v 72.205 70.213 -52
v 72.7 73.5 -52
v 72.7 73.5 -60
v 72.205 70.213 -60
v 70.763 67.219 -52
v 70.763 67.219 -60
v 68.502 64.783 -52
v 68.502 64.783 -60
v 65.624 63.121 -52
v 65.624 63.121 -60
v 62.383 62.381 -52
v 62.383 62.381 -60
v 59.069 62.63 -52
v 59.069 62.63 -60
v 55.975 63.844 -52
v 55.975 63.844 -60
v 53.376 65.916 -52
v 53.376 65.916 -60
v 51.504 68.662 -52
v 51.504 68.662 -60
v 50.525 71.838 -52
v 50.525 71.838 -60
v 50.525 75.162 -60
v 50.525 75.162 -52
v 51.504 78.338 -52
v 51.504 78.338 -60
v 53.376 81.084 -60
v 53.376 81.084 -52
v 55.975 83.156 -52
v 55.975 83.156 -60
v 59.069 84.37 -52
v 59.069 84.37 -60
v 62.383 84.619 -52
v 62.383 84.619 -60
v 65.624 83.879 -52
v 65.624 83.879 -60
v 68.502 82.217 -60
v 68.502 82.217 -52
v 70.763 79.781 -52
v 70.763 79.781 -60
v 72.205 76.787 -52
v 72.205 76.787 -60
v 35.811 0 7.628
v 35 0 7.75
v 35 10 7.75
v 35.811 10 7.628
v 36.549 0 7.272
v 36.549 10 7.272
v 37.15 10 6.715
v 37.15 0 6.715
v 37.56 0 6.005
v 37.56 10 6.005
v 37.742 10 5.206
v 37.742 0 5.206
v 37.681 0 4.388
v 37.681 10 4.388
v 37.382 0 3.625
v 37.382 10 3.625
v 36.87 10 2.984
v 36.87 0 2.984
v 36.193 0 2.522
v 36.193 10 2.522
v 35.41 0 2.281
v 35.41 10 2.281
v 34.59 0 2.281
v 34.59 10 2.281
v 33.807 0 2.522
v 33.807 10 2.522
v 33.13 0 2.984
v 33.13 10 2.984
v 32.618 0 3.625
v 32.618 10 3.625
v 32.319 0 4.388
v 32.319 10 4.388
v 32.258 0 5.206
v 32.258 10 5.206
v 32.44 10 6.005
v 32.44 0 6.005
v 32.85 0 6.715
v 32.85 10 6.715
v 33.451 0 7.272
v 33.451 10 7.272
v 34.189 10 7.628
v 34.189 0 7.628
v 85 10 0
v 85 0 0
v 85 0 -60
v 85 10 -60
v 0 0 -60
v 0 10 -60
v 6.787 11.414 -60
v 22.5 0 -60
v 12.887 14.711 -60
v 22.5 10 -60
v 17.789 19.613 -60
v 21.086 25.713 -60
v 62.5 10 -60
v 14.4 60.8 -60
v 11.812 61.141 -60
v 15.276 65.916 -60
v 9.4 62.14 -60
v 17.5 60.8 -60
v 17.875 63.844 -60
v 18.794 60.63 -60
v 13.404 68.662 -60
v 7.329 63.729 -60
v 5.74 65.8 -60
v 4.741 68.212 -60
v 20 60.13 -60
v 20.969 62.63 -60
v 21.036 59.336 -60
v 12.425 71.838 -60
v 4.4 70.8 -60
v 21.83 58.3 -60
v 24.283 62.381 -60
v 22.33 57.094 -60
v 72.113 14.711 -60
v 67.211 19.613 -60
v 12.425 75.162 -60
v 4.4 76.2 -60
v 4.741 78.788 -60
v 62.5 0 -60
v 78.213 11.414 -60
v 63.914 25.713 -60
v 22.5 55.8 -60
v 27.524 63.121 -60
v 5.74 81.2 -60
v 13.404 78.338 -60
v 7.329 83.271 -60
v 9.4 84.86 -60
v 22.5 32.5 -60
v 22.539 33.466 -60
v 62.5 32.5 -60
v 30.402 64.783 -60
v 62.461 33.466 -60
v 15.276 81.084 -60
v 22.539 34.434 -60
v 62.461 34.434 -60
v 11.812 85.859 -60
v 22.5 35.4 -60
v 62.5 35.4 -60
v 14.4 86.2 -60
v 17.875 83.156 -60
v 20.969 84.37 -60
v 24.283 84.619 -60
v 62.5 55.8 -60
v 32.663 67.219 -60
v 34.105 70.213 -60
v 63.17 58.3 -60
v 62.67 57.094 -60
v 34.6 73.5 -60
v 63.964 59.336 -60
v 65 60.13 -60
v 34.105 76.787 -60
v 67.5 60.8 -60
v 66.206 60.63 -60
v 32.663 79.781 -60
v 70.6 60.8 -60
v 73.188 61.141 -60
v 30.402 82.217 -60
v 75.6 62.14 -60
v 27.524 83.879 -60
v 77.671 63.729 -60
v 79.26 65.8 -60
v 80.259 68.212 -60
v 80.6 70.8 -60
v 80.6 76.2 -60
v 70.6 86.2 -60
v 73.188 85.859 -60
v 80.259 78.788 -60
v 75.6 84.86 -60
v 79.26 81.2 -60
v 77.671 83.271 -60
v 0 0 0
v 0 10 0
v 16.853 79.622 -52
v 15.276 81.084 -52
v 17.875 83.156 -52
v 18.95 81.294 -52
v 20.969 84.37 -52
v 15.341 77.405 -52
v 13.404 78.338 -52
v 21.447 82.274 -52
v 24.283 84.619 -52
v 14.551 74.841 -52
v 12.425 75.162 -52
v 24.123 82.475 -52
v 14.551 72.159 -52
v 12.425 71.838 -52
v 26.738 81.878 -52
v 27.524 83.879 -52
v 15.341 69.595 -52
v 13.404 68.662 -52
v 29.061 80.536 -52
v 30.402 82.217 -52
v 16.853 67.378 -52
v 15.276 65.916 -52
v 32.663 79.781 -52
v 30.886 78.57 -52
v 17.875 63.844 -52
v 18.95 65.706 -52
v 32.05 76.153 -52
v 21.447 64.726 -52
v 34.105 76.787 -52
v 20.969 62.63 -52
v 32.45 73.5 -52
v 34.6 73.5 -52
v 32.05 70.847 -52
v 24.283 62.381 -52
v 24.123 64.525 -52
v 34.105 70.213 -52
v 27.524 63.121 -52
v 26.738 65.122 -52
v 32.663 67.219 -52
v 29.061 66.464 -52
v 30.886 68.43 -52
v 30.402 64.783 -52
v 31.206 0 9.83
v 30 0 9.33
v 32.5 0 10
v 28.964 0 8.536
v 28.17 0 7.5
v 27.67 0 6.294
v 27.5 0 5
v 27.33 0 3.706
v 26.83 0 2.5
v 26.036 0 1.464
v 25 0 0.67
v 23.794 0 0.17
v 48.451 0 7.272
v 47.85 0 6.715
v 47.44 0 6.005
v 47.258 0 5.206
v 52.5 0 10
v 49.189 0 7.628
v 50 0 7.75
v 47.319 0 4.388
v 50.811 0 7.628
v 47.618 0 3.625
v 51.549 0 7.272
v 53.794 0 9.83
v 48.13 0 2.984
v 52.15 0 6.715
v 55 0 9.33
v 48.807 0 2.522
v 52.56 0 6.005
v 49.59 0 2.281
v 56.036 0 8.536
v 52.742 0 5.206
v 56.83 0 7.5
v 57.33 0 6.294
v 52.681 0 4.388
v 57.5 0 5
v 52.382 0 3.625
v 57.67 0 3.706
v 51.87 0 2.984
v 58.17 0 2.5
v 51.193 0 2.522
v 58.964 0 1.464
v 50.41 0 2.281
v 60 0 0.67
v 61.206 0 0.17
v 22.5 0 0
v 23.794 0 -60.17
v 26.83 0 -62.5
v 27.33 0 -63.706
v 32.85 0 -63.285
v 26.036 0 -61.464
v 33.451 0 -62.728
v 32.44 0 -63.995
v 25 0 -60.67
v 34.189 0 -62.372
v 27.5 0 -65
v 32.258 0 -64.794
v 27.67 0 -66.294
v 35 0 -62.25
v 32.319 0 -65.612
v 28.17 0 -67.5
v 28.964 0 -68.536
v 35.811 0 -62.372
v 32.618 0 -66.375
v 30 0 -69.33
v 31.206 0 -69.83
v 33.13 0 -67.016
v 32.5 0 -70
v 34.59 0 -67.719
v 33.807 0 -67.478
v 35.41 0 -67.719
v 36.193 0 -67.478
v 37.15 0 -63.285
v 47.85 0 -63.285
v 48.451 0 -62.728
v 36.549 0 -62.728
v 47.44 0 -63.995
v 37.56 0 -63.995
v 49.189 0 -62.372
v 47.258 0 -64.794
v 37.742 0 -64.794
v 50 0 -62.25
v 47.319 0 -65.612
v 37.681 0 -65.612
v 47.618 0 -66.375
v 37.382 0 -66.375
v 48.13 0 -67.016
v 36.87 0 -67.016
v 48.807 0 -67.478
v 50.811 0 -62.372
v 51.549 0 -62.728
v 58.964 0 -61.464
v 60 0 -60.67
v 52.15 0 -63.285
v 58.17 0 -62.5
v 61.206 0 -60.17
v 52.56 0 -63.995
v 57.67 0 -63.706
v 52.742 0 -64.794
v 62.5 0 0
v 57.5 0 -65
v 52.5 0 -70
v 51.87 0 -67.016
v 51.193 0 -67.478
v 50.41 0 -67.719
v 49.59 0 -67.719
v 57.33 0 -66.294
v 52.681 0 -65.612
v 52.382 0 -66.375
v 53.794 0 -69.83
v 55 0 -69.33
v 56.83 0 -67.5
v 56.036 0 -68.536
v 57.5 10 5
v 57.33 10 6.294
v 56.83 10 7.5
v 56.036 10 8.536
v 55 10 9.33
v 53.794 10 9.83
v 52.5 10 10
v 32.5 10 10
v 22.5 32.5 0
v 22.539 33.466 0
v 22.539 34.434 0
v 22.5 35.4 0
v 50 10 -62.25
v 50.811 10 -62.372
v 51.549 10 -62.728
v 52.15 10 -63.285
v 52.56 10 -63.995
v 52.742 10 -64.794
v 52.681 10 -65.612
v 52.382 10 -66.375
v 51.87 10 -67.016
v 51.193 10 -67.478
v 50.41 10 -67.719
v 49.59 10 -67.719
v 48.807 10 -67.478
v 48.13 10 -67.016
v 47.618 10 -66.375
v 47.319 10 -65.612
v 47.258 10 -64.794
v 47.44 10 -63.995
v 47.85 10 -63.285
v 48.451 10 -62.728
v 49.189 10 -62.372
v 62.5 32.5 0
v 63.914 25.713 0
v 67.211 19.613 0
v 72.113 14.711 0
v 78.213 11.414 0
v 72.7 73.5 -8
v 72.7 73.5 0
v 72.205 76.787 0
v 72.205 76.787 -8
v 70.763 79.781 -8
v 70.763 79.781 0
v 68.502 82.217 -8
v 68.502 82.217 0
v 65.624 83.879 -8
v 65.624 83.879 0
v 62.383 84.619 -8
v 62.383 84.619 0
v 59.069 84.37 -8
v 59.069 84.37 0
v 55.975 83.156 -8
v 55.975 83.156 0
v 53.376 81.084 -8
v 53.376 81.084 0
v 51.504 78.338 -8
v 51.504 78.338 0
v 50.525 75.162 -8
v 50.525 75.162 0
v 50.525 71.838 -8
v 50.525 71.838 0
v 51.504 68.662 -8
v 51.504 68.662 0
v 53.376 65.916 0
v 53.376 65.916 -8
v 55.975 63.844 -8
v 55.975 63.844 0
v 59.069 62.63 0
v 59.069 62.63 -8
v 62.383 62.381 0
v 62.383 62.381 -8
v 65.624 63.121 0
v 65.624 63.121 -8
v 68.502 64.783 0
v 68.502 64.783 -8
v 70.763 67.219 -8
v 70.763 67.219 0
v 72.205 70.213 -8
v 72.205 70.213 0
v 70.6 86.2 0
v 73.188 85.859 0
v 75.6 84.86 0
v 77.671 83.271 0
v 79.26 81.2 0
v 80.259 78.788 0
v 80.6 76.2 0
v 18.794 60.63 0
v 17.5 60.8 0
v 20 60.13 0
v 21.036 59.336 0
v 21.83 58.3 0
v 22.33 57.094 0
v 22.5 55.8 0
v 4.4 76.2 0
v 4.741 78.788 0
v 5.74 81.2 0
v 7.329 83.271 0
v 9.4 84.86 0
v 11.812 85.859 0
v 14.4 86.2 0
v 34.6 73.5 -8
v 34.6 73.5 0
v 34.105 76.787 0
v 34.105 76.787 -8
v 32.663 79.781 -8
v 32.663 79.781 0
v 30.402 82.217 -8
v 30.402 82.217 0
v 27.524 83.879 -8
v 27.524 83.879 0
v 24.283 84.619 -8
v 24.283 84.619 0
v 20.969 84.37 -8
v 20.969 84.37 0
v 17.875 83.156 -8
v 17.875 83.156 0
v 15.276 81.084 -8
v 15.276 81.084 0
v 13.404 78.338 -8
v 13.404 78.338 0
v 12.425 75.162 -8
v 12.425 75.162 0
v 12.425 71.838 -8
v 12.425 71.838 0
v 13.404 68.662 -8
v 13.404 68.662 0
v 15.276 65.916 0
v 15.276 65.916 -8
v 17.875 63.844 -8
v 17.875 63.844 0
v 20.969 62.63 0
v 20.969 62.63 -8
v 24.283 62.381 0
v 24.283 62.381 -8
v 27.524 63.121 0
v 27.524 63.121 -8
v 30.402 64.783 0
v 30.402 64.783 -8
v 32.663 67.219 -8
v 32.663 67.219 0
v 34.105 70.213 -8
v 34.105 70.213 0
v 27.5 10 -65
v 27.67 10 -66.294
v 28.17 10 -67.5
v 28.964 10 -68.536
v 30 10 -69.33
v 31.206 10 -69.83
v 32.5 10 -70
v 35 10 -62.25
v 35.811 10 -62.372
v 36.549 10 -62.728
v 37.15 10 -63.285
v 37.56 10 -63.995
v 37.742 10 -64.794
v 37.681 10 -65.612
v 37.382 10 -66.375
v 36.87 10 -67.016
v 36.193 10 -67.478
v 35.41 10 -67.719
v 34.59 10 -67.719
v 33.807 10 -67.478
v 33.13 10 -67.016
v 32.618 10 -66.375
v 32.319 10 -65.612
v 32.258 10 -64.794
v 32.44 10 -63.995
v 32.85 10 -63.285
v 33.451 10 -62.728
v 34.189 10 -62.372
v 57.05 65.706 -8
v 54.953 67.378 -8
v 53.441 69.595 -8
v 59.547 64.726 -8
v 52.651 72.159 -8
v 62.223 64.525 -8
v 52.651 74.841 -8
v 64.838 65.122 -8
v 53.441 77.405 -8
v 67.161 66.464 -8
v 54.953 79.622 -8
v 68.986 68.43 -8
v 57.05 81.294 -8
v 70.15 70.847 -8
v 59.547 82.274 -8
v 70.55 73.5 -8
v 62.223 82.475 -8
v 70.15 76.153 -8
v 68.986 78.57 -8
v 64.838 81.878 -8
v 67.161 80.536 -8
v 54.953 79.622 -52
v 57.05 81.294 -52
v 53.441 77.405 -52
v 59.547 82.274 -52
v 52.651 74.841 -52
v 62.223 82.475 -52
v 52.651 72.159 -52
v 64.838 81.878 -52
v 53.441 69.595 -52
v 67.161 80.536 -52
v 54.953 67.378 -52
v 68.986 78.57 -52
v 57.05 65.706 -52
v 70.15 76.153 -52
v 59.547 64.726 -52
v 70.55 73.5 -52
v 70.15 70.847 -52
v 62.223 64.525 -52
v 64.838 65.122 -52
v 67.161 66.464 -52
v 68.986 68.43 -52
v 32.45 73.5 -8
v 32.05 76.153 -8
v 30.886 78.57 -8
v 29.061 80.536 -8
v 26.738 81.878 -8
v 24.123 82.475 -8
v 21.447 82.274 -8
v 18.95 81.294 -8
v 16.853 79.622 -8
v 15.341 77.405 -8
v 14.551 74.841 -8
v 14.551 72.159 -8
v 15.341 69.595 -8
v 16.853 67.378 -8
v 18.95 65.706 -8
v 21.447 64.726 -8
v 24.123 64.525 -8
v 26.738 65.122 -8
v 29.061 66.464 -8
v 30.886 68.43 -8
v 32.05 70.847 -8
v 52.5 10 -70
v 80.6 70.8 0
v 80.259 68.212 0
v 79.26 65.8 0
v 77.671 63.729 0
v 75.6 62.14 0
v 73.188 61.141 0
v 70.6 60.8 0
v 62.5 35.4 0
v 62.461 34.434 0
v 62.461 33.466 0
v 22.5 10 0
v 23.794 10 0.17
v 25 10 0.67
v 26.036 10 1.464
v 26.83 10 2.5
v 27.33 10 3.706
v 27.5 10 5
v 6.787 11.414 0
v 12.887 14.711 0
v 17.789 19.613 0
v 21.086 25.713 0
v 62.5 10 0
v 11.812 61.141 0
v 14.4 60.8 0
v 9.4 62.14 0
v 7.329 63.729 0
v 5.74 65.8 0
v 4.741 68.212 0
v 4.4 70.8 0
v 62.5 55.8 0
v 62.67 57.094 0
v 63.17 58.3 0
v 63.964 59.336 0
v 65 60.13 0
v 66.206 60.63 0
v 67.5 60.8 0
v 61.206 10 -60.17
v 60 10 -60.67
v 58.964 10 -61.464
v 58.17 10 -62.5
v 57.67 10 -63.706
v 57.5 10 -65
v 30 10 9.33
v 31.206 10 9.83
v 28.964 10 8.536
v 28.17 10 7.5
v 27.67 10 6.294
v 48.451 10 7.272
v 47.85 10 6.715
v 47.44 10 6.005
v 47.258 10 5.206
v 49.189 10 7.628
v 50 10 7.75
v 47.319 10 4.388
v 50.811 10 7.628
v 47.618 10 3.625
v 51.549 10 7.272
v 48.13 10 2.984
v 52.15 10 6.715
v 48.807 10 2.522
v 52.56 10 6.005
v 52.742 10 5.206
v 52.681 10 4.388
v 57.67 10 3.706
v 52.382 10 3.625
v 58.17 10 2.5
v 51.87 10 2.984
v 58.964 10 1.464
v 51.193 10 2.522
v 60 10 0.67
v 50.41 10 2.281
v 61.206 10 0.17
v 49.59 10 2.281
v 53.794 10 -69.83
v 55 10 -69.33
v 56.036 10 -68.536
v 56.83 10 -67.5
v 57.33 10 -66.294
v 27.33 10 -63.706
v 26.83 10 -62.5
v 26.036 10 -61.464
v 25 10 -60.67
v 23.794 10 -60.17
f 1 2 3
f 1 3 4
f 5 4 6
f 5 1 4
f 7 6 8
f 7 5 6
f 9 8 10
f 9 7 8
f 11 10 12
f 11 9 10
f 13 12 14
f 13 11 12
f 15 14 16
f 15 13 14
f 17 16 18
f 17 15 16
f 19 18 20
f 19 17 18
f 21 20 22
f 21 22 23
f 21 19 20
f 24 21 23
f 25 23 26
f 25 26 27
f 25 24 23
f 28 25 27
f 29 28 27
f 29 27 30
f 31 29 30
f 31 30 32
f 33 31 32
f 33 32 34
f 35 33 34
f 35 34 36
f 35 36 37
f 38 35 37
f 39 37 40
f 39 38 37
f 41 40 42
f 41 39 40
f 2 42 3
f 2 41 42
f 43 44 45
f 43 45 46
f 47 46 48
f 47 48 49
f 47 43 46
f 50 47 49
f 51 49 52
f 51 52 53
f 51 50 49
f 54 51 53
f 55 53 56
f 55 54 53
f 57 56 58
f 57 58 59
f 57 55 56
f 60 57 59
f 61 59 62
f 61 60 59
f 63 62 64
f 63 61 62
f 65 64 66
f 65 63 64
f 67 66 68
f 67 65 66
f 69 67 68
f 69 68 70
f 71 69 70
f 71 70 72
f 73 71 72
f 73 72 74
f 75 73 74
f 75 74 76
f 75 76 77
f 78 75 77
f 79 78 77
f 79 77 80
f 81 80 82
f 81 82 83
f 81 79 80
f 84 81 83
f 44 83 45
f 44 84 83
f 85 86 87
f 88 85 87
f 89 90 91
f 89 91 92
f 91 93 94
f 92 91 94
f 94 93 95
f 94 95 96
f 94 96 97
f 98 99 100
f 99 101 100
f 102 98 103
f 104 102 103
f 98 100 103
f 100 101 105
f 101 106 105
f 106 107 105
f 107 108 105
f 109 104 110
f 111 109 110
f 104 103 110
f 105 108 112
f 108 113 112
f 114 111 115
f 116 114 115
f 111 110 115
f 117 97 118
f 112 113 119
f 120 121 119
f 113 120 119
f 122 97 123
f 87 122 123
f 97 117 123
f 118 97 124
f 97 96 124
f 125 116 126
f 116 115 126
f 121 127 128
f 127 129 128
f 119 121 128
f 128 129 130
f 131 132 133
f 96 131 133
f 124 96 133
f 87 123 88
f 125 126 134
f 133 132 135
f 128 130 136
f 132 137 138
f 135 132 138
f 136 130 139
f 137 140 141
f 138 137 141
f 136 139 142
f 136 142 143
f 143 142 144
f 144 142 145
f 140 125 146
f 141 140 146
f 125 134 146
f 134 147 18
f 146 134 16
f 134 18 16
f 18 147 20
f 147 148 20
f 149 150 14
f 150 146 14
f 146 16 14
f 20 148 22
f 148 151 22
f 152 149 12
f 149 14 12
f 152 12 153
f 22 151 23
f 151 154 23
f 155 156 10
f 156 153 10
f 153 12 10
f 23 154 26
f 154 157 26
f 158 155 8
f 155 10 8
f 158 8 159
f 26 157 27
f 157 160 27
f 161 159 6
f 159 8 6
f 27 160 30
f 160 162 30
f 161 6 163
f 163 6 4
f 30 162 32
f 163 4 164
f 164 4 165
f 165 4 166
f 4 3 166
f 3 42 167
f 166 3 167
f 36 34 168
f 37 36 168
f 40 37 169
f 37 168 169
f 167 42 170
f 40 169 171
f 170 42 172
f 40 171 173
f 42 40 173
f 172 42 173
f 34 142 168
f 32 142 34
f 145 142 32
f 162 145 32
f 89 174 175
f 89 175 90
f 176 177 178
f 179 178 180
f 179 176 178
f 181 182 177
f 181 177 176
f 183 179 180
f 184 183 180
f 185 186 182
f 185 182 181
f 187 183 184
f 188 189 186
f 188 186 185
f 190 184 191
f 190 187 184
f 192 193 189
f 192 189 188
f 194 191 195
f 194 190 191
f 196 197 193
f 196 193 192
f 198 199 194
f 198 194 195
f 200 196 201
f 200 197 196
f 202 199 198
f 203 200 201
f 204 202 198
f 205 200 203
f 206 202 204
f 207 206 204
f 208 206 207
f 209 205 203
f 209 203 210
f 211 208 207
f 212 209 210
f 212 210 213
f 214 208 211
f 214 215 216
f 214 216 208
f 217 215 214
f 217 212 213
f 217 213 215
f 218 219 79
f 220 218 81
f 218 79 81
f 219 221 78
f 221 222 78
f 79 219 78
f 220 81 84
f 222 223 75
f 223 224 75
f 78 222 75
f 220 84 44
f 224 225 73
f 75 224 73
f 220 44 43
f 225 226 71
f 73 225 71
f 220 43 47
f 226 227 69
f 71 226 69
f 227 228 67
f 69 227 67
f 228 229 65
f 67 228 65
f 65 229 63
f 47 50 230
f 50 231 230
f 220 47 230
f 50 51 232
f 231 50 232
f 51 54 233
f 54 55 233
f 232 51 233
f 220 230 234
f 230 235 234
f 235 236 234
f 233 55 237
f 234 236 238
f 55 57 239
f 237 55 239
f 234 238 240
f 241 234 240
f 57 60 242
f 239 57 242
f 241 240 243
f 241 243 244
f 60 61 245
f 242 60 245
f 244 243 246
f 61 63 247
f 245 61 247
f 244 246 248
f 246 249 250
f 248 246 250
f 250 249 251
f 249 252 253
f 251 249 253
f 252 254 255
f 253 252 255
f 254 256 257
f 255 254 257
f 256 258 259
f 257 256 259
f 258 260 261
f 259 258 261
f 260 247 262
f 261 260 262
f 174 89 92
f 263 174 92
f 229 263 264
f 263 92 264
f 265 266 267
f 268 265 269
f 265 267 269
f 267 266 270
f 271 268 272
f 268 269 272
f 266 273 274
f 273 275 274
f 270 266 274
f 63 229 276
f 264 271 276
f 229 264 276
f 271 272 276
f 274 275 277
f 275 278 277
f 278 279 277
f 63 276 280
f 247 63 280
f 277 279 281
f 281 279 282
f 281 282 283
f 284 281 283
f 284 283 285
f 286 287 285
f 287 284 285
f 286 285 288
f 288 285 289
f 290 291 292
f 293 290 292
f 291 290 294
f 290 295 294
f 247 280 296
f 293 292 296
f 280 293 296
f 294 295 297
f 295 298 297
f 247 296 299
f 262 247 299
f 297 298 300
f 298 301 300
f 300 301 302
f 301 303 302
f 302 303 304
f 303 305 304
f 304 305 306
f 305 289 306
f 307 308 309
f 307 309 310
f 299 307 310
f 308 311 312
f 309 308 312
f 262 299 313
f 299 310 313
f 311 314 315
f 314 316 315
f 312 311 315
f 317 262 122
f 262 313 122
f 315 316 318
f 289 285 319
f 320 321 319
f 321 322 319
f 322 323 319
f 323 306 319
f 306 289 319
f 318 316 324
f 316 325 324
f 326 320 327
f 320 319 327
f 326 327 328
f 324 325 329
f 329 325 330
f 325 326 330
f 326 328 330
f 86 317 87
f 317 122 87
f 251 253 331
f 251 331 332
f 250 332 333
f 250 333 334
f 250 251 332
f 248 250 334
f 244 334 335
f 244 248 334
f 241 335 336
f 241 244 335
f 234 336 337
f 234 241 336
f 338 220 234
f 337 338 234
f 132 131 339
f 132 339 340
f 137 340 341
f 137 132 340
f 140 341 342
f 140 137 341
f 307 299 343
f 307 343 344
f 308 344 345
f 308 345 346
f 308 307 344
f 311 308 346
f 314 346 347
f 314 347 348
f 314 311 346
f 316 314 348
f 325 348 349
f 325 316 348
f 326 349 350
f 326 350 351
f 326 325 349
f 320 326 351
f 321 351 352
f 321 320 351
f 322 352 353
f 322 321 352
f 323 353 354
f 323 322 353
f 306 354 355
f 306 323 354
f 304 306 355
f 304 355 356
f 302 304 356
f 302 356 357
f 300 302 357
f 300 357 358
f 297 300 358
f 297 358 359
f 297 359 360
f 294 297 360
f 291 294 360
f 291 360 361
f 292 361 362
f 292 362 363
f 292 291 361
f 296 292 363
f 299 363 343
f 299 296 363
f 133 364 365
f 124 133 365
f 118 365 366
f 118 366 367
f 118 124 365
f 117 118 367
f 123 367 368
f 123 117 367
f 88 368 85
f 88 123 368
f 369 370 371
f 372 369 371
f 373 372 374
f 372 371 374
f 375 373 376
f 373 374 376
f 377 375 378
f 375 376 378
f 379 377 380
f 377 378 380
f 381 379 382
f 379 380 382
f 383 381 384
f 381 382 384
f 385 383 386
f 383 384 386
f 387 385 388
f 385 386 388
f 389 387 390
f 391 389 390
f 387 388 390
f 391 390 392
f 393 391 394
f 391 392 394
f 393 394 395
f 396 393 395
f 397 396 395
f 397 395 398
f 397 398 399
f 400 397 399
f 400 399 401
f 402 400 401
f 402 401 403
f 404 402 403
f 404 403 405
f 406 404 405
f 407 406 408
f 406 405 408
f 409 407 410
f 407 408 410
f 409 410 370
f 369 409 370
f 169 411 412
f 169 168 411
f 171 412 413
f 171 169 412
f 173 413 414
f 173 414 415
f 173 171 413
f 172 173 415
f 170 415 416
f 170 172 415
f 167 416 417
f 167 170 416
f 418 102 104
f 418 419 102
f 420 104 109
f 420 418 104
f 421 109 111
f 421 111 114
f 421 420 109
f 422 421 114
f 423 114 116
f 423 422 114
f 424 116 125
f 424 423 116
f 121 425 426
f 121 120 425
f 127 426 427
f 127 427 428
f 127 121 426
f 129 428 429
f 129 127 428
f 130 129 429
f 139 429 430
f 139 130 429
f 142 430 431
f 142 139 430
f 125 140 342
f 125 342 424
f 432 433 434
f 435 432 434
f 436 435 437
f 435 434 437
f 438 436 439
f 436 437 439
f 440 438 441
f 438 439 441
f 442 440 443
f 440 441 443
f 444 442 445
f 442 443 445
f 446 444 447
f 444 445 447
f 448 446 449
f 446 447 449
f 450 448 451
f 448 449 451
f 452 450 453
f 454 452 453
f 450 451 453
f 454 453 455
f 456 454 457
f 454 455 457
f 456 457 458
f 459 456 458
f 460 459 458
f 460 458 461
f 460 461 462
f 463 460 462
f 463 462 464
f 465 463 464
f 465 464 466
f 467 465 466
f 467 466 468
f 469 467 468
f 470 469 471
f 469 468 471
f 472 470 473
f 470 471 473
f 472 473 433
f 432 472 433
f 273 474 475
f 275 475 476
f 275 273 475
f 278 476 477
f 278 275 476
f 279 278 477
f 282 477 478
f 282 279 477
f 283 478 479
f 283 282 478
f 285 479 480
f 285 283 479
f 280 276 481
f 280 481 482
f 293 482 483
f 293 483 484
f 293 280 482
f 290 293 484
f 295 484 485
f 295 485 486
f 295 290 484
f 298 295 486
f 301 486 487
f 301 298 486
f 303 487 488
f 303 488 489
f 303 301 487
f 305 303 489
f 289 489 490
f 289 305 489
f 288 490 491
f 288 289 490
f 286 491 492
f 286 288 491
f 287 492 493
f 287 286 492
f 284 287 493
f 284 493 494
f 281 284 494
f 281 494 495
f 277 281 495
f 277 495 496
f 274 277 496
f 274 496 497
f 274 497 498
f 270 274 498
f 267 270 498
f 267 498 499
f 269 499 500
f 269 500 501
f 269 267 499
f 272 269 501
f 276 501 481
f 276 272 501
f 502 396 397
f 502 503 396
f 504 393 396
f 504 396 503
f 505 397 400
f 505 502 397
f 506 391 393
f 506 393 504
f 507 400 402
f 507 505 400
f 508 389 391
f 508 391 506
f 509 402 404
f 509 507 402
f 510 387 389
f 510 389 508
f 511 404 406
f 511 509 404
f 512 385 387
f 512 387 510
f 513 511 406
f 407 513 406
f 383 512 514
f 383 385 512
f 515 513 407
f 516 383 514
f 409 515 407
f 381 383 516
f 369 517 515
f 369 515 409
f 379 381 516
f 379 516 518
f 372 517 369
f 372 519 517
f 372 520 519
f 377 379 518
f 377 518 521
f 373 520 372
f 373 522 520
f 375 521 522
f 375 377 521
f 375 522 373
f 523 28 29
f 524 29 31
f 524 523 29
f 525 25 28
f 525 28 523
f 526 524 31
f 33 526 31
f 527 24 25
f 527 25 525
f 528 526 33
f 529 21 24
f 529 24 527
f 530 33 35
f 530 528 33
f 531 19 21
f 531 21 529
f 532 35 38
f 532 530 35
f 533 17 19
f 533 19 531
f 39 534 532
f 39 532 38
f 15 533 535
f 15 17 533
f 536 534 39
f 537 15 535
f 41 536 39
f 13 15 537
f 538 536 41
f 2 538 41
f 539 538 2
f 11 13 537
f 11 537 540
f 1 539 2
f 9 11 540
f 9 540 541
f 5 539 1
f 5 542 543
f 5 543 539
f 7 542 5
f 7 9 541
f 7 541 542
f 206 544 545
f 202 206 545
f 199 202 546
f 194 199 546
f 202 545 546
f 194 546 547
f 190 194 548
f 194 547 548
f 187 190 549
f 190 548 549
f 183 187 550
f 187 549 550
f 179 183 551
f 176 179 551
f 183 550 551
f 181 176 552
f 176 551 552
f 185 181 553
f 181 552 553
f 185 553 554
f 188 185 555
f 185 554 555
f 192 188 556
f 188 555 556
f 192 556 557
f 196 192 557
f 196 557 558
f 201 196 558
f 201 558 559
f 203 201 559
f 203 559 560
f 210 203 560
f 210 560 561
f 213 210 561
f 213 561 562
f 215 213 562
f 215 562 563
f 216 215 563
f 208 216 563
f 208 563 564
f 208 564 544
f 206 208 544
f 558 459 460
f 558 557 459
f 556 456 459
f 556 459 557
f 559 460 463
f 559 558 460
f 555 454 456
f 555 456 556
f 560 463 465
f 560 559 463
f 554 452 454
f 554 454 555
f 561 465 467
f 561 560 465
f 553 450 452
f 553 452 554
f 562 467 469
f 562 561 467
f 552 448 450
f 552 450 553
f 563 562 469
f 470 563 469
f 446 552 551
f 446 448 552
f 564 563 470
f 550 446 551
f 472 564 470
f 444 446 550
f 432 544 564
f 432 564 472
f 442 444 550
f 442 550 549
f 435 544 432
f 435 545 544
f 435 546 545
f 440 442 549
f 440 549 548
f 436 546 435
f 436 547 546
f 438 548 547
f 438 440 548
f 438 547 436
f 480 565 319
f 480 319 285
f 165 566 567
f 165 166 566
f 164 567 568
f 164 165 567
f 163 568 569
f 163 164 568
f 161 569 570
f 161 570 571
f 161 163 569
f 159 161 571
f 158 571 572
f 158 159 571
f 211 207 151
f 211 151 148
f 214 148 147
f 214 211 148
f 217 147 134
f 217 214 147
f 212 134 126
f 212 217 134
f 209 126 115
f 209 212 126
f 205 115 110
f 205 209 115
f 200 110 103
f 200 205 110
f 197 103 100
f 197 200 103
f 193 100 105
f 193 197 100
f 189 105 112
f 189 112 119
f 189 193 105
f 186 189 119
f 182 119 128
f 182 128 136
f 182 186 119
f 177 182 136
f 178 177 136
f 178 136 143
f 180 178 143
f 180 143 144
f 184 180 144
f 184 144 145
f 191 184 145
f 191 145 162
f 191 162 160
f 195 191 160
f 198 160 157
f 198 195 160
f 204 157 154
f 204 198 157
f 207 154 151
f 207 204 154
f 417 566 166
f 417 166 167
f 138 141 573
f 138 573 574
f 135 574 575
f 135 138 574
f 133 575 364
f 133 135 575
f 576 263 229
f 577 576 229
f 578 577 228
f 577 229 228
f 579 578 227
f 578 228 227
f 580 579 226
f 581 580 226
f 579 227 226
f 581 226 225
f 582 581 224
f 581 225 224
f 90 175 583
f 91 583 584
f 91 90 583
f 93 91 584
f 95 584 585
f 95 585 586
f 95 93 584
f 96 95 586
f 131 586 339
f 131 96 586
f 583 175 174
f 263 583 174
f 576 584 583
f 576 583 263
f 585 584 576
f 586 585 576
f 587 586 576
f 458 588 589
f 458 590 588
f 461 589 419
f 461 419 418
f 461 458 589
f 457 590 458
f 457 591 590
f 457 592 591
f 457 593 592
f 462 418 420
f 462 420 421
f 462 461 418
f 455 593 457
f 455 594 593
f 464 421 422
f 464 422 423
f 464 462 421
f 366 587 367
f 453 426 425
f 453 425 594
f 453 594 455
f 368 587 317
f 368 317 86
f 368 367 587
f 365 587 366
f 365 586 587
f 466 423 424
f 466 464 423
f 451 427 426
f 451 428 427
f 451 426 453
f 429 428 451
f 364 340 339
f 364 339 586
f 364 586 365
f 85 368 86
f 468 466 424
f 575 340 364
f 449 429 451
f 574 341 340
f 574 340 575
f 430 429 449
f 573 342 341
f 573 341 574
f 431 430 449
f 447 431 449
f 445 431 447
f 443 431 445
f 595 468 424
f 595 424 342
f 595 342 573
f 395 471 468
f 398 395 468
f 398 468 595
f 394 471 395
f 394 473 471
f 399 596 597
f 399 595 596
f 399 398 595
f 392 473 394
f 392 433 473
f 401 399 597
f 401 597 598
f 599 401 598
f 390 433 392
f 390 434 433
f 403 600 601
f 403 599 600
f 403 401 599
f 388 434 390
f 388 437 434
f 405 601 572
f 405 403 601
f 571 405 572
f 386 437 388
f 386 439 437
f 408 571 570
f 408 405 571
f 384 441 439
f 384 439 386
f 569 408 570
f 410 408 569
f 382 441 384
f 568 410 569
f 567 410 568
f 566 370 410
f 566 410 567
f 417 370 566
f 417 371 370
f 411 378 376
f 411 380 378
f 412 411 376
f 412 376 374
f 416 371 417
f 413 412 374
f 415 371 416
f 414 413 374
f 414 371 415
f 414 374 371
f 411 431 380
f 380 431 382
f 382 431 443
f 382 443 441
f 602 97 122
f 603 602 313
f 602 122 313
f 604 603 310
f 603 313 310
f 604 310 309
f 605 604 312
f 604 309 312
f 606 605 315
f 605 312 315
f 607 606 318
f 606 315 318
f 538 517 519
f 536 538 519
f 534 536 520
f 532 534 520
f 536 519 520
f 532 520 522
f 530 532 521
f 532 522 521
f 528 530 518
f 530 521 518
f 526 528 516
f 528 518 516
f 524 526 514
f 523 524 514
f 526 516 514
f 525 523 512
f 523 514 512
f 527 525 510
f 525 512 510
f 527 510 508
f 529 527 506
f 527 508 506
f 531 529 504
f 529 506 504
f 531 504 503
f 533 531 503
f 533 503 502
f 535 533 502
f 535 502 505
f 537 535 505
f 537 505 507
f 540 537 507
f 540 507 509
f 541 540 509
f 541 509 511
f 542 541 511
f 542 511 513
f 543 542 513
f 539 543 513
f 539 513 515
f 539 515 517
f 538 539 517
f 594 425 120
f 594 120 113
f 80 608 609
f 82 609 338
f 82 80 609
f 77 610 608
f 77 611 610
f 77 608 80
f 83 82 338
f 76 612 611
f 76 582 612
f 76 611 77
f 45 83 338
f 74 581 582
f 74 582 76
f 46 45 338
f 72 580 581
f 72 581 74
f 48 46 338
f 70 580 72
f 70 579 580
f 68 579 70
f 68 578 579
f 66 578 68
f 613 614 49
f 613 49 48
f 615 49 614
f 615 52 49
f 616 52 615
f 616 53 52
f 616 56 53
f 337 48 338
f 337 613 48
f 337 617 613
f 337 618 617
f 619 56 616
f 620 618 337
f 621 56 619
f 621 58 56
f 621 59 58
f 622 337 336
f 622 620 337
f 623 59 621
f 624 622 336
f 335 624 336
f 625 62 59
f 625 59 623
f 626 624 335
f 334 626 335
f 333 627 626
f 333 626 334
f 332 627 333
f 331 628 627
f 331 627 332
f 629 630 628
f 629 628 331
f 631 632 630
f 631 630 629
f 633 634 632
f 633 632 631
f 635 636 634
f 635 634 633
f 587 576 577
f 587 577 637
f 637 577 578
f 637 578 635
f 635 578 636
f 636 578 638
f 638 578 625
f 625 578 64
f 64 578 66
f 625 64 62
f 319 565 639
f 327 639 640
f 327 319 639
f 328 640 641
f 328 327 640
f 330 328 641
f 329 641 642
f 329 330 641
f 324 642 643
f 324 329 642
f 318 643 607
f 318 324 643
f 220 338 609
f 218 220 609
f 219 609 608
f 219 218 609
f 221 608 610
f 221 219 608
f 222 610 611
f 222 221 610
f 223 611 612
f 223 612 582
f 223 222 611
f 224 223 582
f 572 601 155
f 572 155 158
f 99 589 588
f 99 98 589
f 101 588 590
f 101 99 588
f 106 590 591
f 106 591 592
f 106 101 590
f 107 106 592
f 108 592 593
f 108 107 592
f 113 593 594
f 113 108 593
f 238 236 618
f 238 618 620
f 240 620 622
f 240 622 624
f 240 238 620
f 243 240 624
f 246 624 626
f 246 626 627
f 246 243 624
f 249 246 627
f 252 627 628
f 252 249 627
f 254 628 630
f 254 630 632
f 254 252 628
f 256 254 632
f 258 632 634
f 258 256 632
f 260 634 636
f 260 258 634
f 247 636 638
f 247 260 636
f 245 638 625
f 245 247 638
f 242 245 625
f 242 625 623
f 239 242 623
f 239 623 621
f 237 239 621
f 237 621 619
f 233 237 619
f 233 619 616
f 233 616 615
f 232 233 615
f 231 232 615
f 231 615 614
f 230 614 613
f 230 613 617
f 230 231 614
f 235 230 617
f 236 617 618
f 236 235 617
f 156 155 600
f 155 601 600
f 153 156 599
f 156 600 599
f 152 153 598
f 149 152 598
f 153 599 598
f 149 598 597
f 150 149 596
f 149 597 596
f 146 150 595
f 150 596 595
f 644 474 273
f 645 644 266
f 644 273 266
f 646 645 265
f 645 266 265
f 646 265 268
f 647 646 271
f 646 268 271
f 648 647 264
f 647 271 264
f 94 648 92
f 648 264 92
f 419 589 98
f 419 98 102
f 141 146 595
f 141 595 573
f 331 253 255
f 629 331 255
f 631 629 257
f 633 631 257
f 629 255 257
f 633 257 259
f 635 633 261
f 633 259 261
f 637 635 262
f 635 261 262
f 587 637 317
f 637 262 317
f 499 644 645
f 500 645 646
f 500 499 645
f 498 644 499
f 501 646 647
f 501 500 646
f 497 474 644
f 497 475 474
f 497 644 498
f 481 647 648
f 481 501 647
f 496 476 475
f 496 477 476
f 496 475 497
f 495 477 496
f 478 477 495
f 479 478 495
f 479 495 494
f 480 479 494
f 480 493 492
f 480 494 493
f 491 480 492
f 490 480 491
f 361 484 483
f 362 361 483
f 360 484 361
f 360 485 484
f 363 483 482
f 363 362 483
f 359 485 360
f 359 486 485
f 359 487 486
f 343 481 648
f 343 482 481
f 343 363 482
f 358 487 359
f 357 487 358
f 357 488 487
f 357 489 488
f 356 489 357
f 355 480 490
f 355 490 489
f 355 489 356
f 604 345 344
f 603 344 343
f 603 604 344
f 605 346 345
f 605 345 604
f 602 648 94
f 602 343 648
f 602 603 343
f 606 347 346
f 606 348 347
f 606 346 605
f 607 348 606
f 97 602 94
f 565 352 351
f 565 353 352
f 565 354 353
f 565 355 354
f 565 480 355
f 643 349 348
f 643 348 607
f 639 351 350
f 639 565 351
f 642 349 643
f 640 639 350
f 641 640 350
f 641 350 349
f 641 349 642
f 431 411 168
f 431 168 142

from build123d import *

# Parameters (mm, degrees)
SKETCH1_W           = 15
SKETCH1_H           = 10
SKETCH1_R           = 2.75
SKETCH1_W_2         = 85
SKETCH1_H_2         = 60
BOSS_EXTRUDE1_DEPTH = 10
BOSS_EXTRUDE2_DEPTH = 70
CUT_EXTRUDE1_DEPTH  = 10
FILLET1_START       = -1
FILLET1_DEPTH       = 11
FILLET1_2_DEPTH     = 10
SKETCH5_R           = 9
BOSS_EXTRUDE3_DEPTH = 60
SKETCH6_R           = 11.15
CUT_EXTRUDE2_DEPTH  = 8
CUT_EXTRUDE3_START  = -8
SKETCH7_R           = 11.15
CUT_EXTRUDE3_DEPTH  = 8
FILLET2_R           = 10
FILLET3_R           = 5


with BuildPart() as part:
    # Sketch1 → Boss-Extrude1 (new body)
    # profile 1 of 5: a face of its own
    with BuildSketch(Plane(origin=(0, 0, 0), x_dir=(1, 0, 0), z_dir=(0, 1, 0))):
        with Locations((35, 65)):
            Rectangle(SKETCH1_W, SKETCH1_H)
        with Locations(Location((35, 65, 0), (0, 0, 270))):
            Circle(SKETCH1_R, mode=Mode.SUBTRACT)
    # profile 2 of 5: a face of its own
    with BuildSketch(Plane(origin=(0, 0, 0), x_dir=(1, 0, 0), z_dir=(0, 1, 0))):
        with Locations((50, 65)):
            Rectangle(SKETCH1_W, SKETCH1_H)
        with Locations(Location((50, 65, 0), (0, 0, 270))):
            Circle(SKETCH1_R, mode=Mode.SUBTRACT)
    # profile 3 of 5: a face of its own
    with BuildSketch(Plane(origin=(0, 0, 0), x_dir=(1, 0, 0), z_dir=(0, 1, 0))):
        with Locations((50, -5)):
            Rectangle(SKETCH1_W, SKETCH1_H)
        with Locations(Location((50, -5, 0), (0, 0, 270))):
            Circle(SKETCH1_R, mode=Mode.SUBTRACT)
    # profile 4 of 5: a face of its own
    with BuildSketch(Plane(origin=(0, 0, 0), x_dir=(1, 0, 0), z_dir=(0, 1, 0))):
        with Locations((35, -5)):
            Rectangle(SKETCH1_W, SKETCH1_H)
        with Locations(Location((35, -5, 0), (0, 0, 270))):
            Circle(SKETCH1_R, mode=Mode.SUBTRACT)
    # profile 5 of 5: a face of its own
    with BuildSketch(Plane(origin=(0, 0, 0), x_dir=(1, 0, 0), z_dir=(0, 1, 0))):
        with Locations((42.5, 30)):
            Rectangle(SKETCH1_W_2, SKETCH1_H_2)
    extrude(amount=BOSS_EXTRUDE1_DEPTH)

    # Sketch4 → Boss-Extrude2 (add)
    with BuildSketch(Plane(origin=(0, 0, -70), x_dir=(-1, 0, 0), z_dir=(0, 0, -1))):
        with BuildLine():
            Line((-85, 10), (-62.5, 10))
            Line((-62.5, 10), (-62.5, 32.5))
            ThreePointArc((-62.5, 32.5), (-69.483783569, 16.983783569), (-85, 10))
        make_face()
        with BuildLine():
            Line((-57.5, 10), (-42.5, 10))
            Line((-42.5, 10), (-42.5, 60.8))
            Line((-42.5, 60.8), (-62.5, 60.8))
            Line((-62.5, 60.8), (-62.5, 35.4))
            ThreePointArc((-62.5, 35.4), (-62.45614662, 33.95), (-62.5, 32.5))
            Line((-62.5, 32.5), (-62.5, 10))
            Line((-62.5, 10), (-57.5, 10))
        make_face()
        with BuildLine():
            Line((-42.5, 60.8), (-42.5, 10))
            Line((-42.5, 10), (-27.5, 10))
            Line((-27.5, 10), (-22.5, 10))
            Line((-22.5, 10), (-22.5, 32.5))
            ThreePointArc((-22.5, 32.5), (-22.54385338, 33.95), (-22.5, 35.4))
            Line((-22.5, 35.4), (-22.5, 60.8))
            Line((-22.5, 60.8), (-42.5, 60.8))
        make_face()
        with BuildLine():
            Line((-22.5, 32.5), (-22.5, 10))
            Line((-22.5, 10), (0, 10))
            ThreePointArc((0, 10), (-15.516216431, 16.983783569), (-22.5, 32.5))
        make_face()
    extrude(amount=-BOSS_EXTRUDE2_DEPTH)

    # Sketch4<4> → Cut-Extrude1 (cut)
    with BuildSketch(Plane(origin=(0, 0, -70), x_dir=(-1, 0, 0), z_dir=(0, 0, -1))):
        with BuildLine():
            Line((-57.5, 10), (-42.5, 10))
            Line((-42.5, 10), (-42.5, 60.8))
            Line((-42.5, 60.8), (-62.5, 60.8))
            Line((-62.5, 60.8), (-62.5, 35.4))
            ThreePointArc((-62.5, 35.4), (-62.45614662, 33.95), (-62.5, 32.5))
            Line((-62.5, 32.5), (-62.5, 10))
            Line((-62.5, 10), (-57.5, 10))
        make_face()
        with BuildLine():
            Line((-42.5, 60.8), (-42.5, 10))
            Line((-42.5, 10), (-27.5, 10))
            Line((-27.5, 10), (-22.5, 10))
            Line((-22.5, 10), (-22.5, 32.5))
            ThreePointArc((-22.5, 32.5), (-22.54385338, 33.95), (-22.5, 35.4))
            Line((-22.5, 35.4), (-22.5, 60.8))
            Line((-22.5, 60.8), (-42.5, 60.8))
        make_face()
        with BuildLine():
            Line((-85, 10), (-62.5, 10))
            Line((-62.5, 10), (-62.5, 32.5))
            ThreePointArc((-62.5, 32.5), (-69.483783569, 16.983783569), (-85, 10))
        make_face()
        with BuildLine():
            Line((-22.5, 32.5), (-22.5, 10))
            Line((-22.5, 10), (0, 10))
            ThreePointArc((0, 10), (-15.516216431, 16.983783569), (-22.5, 32.5))
        make_face()
    extrude(amount=-CUT_EXTRUDE1_DEPTH, mode=Mode.SUBTRACT)

    # Fillet1: read off the stored shape, not the designer's step
    # Fillet1 outline → Fillet1 (cut)
    with BuildSketch(Plane(origin=(0, 0, 0), x_dir=(1, 0, 0), z_dir=(0, 1, 0)).offset(FILLET1_START)):
        with BuildLine():
            Line((27.5, 70), (27.5, 65))
            ThreePointArc((27.5, 65), (28.964466094, 68.535533906), (32.5, 70))
            Line((32.5, 70), (27.5, 70))
        make_face()
        with BuildLine():
            Line((57.5, 70), (52.5, 70))
            ThreePointArc((52.5, 70), (56.035533906, 68.535533906), (57.5, 65))
            Line((57.5, 65), (57.5, 70))
        make_face()
        with BuildLine():
            Line((57.5, -10), (57.5, -5))
            ThreePointArc((57.5, -5), (56.035533906, -8.535533906), (52.5, -10))
            Line((52.5, -10), (57.5, -10))
        make_face()
        with BuildLine():
            Line((27.5, -10), (32.5, -10))
            ThreePointArc((32.5, -10), (28.964466094, -8.535533906), (27.5, -5))
            Line((27.5, -5), (27.5, -10))
        make_face()
    extrude(amount=FILLET1_DEPTH, mode=Mode.SUBTRACT)

    # Fillet1 2 outline → Fillet1 2 (add)
    with BuildSketch(Plane(origin=(0, 0, 0), x_dir=(1, 0, 0), z_dir=(0, 1, 0))):
        with BuildLine():
            ThreePointArc((27.5, 65), (26.035533906, 61.464466094), (22.5, 60))
            Line((22.5, 60), (27.5, 60))
            Line((27.5, 60), (27.5, 65))
        make_face()
        with BuildLine():
            Line((57.5, 65), (57.5, 60))
            Line((57.5, 60), (62.5, 60))
            ThreePointArc((62.5, 60), (58.964466094, 61.464466094), (57.5, 65))
        make_face()
        with BuildLine():
            Line((57.5, 0), (57.5, -5))
            ThreePointArc((57.5, -5), (58.964466094, -1.464466094), (62.5, 0))
            Line((62.5, 0), (57.5, 0))
        make_face()
        with BuildLine():
            Line((27.5, -5), (27.5, 0))
            Line((27.5, 0), (22.5, 0))
            ThreePointArc((22.5, 0), (26.035533906, -1.464466094), (27.5, -5))
        make_face()
    extrude(amount=FILLET1_2_DEPTH)

    # Sketch5 → Boss-Extrude3 (add)
    # profile 1 of 2: a face of its own
    with BuildSketch(Plane.XY):
        Polygon((22.5, 60.8), (42.5, 60.8), (42.5, 86.2), (4.4, 86.2), (4.4, 60.8), align=None)
        with Locations((23.45, 73.5)):
            Circle(SKETCH5_R, mode=Mode.SUBTRACT)
    # profile 2 of 2: a face of its own
    with BuildSketch(Plane.XY):
        Polygon((42.5, 86.2), (42.5, 60.8), (62.5, 60.8), (80.6, 60.8), (80.6, 86.2), align=None)
        with Locations((61.55, 73.5)):
            Circle(SKETCH5_R, mode=Mode.SUBTRACT)
    extrude(amount=-BOSS_EXTRUDE3_DEPTH)

    # Sketch6 → Cut-Extrude2 (cut)
    with BuildSketch(Plane.XY):
        with Locations((23.45, 73.5)):
            Circle(SKETCH6_R)
        with Locations((61.55, 73.5)):
            Circle(SKETCH6_R)
    extrude(amount=-CUT_EXTRUDE2_DEPTH, mode=Mode.SUBTRACT)

    # Sketch7 → Cut-Extrude3 (cut)
    with BuildSketch(Plane(origin=(0, 0, -60), x_dir=(-1, 0, 0), z_dir=(0, 0, -1)).offset(CUT_EXTRUDE3_START)):
        with Locations(Location((-61.55, 73.5, 0), (0, 0, 180))):
            Circle(SKETCH7_R)
        with Locations(Location((-23.45, 73.5, 0), (0, 0, 180))):
            Circle(SKETCH7_R)
    extrude(amount=CUT_EXTRUDE3_DEPTH, mode=Mode.SUBTRACT)

    # Fillet2
    fillet2_edges = [part.edges().sort_by_distance(p)[0] for p in [
        (80.6, 60.8, -30),
        (4.4, 60.8, -30),
        (4.4, 86.2, -30),
        (80.6, 86.2, -30),
    ]]
    fillet(fillet2_edges, radius=FILLET2_R)

    # Fillet3
    fillet3_edges = [part.edges().sort_by_distance(p)[0] for p in [
        (62.5, 60.8, -30),
        (22.5, 60.8, -30),
    ]]
    fillet(fillet3_edges, radius=FILLET3_R)


solid = part.part
